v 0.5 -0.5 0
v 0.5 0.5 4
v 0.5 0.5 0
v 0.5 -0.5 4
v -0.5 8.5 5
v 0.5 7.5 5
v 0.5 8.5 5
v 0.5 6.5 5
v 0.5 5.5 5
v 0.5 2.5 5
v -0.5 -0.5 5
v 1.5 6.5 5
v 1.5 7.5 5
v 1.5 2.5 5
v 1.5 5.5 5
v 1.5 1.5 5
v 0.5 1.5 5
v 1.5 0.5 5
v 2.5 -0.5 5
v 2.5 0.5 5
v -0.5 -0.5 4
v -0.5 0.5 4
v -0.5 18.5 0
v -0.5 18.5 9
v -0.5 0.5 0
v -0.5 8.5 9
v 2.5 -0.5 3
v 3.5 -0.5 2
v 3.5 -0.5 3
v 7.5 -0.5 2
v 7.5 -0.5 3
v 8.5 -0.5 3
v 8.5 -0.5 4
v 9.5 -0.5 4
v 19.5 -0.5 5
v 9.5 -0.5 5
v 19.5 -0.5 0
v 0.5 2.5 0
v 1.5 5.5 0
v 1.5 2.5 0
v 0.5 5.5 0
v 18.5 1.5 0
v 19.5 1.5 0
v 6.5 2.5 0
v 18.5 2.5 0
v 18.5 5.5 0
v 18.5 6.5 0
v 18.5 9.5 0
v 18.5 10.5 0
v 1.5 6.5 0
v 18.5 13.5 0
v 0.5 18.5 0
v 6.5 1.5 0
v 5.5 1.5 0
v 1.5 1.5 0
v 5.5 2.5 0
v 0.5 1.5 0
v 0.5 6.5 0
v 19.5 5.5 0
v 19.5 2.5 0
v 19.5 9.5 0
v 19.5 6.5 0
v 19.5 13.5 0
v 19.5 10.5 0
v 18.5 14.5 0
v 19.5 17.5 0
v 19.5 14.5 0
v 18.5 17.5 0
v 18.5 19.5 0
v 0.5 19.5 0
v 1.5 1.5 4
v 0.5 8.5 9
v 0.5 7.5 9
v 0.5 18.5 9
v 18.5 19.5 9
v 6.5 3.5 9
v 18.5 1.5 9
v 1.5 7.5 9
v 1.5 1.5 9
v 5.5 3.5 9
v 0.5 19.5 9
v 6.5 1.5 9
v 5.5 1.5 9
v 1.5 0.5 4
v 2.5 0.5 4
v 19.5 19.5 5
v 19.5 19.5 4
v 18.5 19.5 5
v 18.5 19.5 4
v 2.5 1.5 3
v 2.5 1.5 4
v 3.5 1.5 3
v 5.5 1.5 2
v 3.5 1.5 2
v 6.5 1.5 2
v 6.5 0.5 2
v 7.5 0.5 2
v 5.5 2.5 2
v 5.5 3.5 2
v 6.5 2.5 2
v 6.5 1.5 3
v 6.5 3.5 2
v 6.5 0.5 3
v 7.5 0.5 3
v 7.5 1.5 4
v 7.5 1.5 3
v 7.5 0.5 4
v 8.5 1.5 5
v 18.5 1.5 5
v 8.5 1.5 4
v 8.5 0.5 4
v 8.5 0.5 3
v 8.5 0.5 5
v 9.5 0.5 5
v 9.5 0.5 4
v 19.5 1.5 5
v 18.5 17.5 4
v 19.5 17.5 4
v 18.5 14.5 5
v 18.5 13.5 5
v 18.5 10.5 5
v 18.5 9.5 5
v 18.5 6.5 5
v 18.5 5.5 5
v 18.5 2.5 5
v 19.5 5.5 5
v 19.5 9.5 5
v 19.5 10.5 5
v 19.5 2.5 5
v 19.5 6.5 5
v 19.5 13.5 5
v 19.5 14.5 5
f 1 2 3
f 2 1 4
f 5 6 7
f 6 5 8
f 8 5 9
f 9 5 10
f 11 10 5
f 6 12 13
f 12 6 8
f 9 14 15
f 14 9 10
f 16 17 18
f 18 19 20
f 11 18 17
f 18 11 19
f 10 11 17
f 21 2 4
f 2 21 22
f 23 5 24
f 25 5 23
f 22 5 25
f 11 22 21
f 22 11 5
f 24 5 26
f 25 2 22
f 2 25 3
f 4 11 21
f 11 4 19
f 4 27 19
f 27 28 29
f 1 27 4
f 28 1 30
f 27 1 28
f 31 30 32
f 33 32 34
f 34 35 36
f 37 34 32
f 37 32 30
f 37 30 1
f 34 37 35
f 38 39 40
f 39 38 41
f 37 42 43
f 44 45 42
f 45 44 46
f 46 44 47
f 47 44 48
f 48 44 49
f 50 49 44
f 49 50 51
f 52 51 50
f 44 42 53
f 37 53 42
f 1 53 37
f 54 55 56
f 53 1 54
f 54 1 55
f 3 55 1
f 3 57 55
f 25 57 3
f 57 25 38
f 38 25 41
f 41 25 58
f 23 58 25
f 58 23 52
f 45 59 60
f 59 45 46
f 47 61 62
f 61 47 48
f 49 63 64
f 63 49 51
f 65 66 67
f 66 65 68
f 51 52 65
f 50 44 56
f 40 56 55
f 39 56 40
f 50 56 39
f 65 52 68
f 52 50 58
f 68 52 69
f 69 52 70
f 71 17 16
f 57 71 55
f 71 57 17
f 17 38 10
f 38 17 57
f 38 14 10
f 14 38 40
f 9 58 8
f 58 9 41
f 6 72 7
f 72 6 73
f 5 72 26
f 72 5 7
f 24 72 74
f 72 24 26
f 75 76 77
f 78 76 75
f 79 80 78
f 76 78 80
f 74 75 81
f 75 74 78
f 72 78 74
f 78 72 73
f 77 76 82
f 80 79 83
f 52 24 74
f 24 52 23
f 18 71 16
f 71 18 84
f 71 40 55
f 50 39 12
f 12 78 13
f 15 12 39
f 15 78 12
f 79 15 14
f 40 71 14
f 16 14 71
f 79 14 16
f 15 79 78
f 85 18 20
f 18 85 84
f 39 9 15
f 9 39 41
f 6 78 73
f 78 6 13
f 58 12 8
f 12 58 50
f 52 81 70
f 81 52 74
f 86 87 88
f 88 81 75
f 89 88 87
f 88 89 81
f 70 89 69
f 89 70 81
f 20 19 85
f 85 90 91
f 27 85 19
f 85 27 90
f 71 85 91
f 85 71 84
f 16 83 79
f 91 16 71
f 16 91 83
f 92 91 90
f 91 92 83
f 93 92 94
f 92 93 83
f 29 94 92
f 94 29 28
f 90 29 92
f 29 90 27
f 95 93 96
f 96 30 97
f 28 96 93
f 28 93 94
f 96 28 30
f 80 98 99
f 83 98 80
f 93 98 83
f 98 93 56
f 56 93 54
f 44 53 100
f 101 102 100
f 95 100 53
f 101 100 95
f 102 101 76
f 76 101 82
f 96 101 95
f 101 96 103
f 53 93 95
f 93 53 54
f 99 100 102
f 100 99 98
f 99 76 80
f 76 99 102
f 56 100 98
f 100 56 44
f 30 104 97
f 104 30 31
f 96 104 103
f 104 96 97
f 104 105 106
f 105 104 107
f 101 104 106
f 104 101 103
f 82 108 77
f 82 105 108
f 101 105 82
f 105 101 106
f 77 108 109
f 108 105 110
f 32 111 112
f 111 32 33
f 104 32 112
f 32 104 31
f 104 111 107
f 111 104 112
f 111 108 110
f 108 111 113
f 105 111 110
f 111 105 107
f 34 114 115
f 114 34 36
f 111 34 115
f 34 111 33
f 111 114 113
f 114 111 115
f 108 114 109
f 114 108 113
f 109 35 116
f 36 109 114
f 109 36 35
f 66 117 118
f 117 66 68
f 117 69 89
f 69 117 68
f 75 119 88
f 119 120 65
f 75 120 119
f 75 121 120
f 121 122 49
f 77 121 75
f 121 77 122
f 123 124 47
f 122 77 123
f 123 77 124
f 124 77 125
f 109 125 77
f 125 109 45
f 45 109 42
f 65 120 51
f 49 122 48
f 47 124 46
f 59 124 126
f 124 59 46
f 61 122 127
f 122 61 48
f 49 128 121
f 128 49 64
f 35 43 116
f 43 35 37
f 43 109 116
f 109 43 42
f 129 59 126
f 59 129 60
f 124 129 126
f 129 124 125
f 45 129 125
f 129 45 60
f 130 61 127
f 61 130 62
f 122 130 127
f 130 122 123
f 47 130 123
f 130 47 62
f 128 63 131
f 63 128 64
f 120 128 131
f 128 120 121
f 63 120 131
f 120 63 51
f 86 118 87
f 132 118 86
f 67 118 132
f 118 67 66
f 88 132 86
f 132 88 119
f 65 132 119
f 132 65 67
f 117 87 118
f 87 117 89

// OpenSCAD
union() {
    translate([0, 0, 4.5]) color([1, 0, 0]) cube([1, 1, 1], center=true);
    translate([0, 1, 2.5]) cube([1, 1, 5], center=true);
    translate([0, 2, 2.5]) cube([1, 1, 5], center=true);
    translate([0, 3, 2.5]) cube([1, 1, 5], center=true);
    translate([0, 4, 2.5]) cube([1, 1, 5], center=true);
    translate([0, 5, 2.5]) cube([1, 1, 5], center=true);
    translate([0, 6, 2.5]) cube([1, 1, 5], center=true);
    translate([0, 7, 2.5]) cube([1, 1, 5], center=true);
    translate([0, 8, 2.5]) cube([1, 1, 5], center=true);
    translate([0, 9, 4.5]) cube([1, 1, 9], center=true);
    translate([0, 10, 4.5]) cube([1, 1, 9], center=true);
    translate([0, 11, 4.5]) cube([1, 1, 9], center=true);
    translate([0, 12, 4.5]) cube([1, 1, 9], center=true);
    translate([0, 13, 4.5]) cube([1, 1, 9], center=true);
    translate([0, 14, 4.5]) cube([1, 1, 9], center=true);
    translate([0, 15, 4.5]) cube([1, 1, 9], center=true);
    translate([0, 16, 4.5]) cube([1, 1, 9], center=true);
    translate([0, 17, 4.5]) cube([1, 1, 9], center=true);
    translate([0, 18, 4.5]) cube([1, 1, 9], center=true);
    translate([1, 0, 2.5]) cube([1, 1, 5], center=true);
    translate([1, 1, 2.5]) cube([1, 1, 5], center=true);
    translate([1, 3, 2.5]) cube([1, 1, 5], center=true);
    translate([1, 4, 2.5]) cube([1, 1, 5], center=true);
    translate([1, 5, 2.5]) cube([1, 1, 5], center=true);
    translate([1, 7, 2.5]) cube([1, 1, 5], center=true);
    translate([1, 8, 4.5]) cube([1, 1, 9], center=true);
    translate([1, 9, 4.5]) cube([1, 1, 9], center=true);
    translate([1, 10, 4.5]) cube([1, 1, 9], center=true);
    translate([1, 11, 4.5]) cube([1, 1, 9], center=true);
    translate([1, 12, 4.5]) cube([1, 1, 9], center=true);
    translate([1, 13, 4.5]) cube([1, 1, 9], center=true);
    translate([1, 14, 4.5]) cube([1, 1, 9], center=true);
    translate([1, 15, 4.5]) cube([1, 1, 9], center=true);
    translate([1, 16, 4.5]) cube([1, 1, 9], center=true);
    translate([1, 17, 4.5]) cube([1, 1, 9], center=true);
    translate([1, 18, 4.5]) cube([1, 1, 9], center=true);
    translate([1, 19, 4.5]) cube([1, 1, 9], center=true);
    translate([2, 0, 2.5]) cube([1, 1, 5], center=true);
    translate([2, 1, 2.0]) cube([1, 1, 4], center=true);
    translate([2, 2, 4.5]) cube([1, 1, 9], center=true);
    translate([2, 3, 4.5]) cube([1, 1, 9], center=true);
    translate([2, 4, 4.5]) cube([1, 1, 9], center=true);
    translate([2, 5, 4.5]) cube([1, 1, 9], center=true);
    translate([2, 6, 4.5]) cube([1, 1, 9], center=true);
    translate([2, 7, 4.5]) cube([1, 1, 9], center=true);
    translate([2, 8, 4.5]) cube([1, 1, 9], center=true);
    translate([2, 9, 4.5]) cube([1, 1, 9], center=true);
    translate([2, 10, 4.5]) cube([1, 1, 9], center=true);
    translate([2, 11, 4.5]) cube([1, 1, 9], center=true);
    translate([2, 12, 4.5]) cube([1, 1, 9], center=true);
    translate([2, 13, 4.5]) cube([1, 1, 9], center=true);
    translate([2, 14, 4.5]) cube([1, 1, 9], center=true);
    translate([2, 15, 4.5]) cube([1, 1, 9], center=true);
    translate([2, 16, 4.5]) cube([1, 1, 9], center=true);
    translate([2, 17, 4.5]) cube([1, 1, 9], center=true);
    translate([2, 18, 4.5]) cube([1, 1, 9], center=true);
    translate([2, 19, 4.5]) cube([1, 1, 9], center=true);
    translate([3, 0, 1.5]) cube([1, 1, 3], center=true);
    translate([3, 1, 1.5]) cube([1, 1, 3], center=true);
    translate([3, 2, 4.5]) cube([1, 1, 9], center=true);
    translate([3, 3, 4.5]) cube([1, 1, 9], center=true);
    translate([3, 4, 4.5]) cube([1, 1, 9], center=true);
    translate([3, 5, 4.5]) cube([1, 1, 9], center=true);
    translate([3, 6, 4.5]) cube([1, 1, 9], center=true);
    translate([3, 7, 4.5]) cube([1, 1, 9], center=true);
    translate([3, 8, 4.5]) cube([1, 1, 9], center=true);
    translate([3, 9, 4.5]) cube([1, 1, 9], center=true);
    translate([3, 10, 4.5]) cube([1, 1, 9], center=true);
    translate([3, 11, 4.5]) cube([1, 1, 9], center=true);
    translate([3, 12, 4.5]) cube([1, 1, 9], center=true);
    translate([3, 13, 4.5]) cube([1, 1, 9], center=true);
    translate([3, 14, 4.5]) cube([1, 1, 9], center=true);
    translate([3, 15, 4.5]) cube([1, 1, 9], center=true);
    translate([3, 16, 4.5]) cube([1, 1, 9], center=true);
    translate([3, 17, 4.5]) cube([1, 1, 9], center=true);
    translate([3, 18, 4.5]) cube([1, 1, 9], center=true);
    translate([3, 19, 4.5]) cube([1, 1, 9], center=true);
    translate([4, 0, 1.0]) cube([1, 1, 2], center=true);
    translate([4, 1, 1.0]) cube([1, 1, 2], center=true);
    translate([4, 2, 4.5]) cube([1, 1, 9], center=true);
    translate([4, 3, 4.5]) cube([1, 1, 9], center=true);
    translate([4, 4, 4.5]) cube([1, 1, 9], center=true);
    translate([4, 5, 4.5]) cube([1, 1, 9], center=true);
    translate([4, 6, 4.5]) cube([1, 1, 9], center=true);
    translate([4, 7, 4.5]) cube([1, 1, 9], center=true);
    translate([4, 8, 4.5]) cube([1, 1, 9], center=true);
    translate([4, 9, 4.5]) cube([1, 1, 9], center=true);
    translate([4, 10, 4.5]) cube([1, 1, 9], center=true);
    translate([4, 11, 4.5]) cube([1, 1, 9], center=true);
    translate([4, 12, 4.5]) cube([1, 1, 9], center=true);
    translate([4, 13, 4.5]) cube([1, 1, 9], center=true);
    translate([4, 14, 4.5]) cube([1, 1, 9], center=true);
    translate([4, 15, 4.5]) cube([1, 1, 9], center=true);
    translate([4, 16, 4.5]) cube([1, 1, 9], center=true);
    translate([4, 17, 4.5]) cube([1, 1, 9], center=true);
    translate([4, 18, 4.5]) cube([1, 1, 9], center=true);
    translate([4, 19, 4.5]) cube([1, 1, 9], center=true);
    translate([5, 0, 1.0]) cube([1, 1, 2], center=true);
    translate([5, 1, 1.0]) cube([1, 1, 2], center=true);
    translate([5, 2, 4.5]) cube([1, 1, 9], center=true);
    translate([5, 3, 4.5]) cube([1, 1, 9], center=true);
    translate([5, 4, 4.5]) cube([1, 1, 9], center=true);
    translate([5, 5, 4.5]) cube([1, 1, 9], center=true);
    translate([5, 6, 4.5]) cube([1, 1, 9], center=true);
    translate([5, 7, 4.5]) cube([1, 1, 9], center=true);
    translate([5, 8, 4.5]) cube([1, 1, 9], center=true);
    translate([5, 9, 4.5]) cube([1, 1, 9], center=true);
    translate([5, 10, 4.5]) cube([1, 1, 9], center=true);
    translate([5, 11, 4.5]) cube([1, 1, 9], center=true);
    translate([5, 12, 4.5]) cube([1, 1, 9], center=true);
    translate([5, 13, 4.5]) cube([1, 1, 9], center=true);
    translate([5, 14, 4.5]) cube([1, 1, 9], center=true);
    translate([5, 15, 4.5]) cube([1, 1, 9], center=true);
    translate([5, 16, 4.5]) cube([1, 1, 9], center=true);
    translate([5, 17, 4.5]) cube([1, 1, 9], center=true);
    translate([5, 18, 4.5]) cube([1, 1, 9], center=true);
    translate([5, 19, 4.5]) cube([1, 1, 9], center=true);
    translate([6, 0, 1.0]) cube([1, 1, 2], center=true);
    translate([6, 1, 1.0]) cube([1, 1, 2], center=true);
    translate([6, 3, 1.0]) cube([1, 1, 2], center=true);
    translate([6, 4, 4.5]) cube([1, 1, 9], center=true);
    translate([6, 5, 4.5]) cube([1, 1, 9], center=true);
    translate([6, 6, 4.5]) cube([1, 1, 9], center=true);
    translate([6, 7, 4.5]) cube([1, 1, 9], center=true);
    translate([6, 8, 4.5]) cube([1, 1, 9], center=true);
    translate([6, 9, 4.5]) cube([1, 1, 9], center=true);
    translate([6, 10, 4.5]) cube([1, 1, 9], center=true);
    translate([6, 11, 4.5]) cube([1, 1, 9], center=true);
    translate([6, 12, 4.5]) cube([1, 1, 9], center=true);
    translate([6, 13, 4.5]) cube([1, 1, 9], center=true);
    translate([6, 14, 4.5]) cube([1, 1, 9], center=true);
    translate([6, 15, 4.5]) cube([1, 1, 9], center=true);
    translate([6, 16, 4.5]) cube([1, 1, 9], center=true);
    translate([6, 17, 4.5]) cube([1, 1, 9], center=true);
    translate([6, 18, 4.5]) cube([1, 1, 9], center=true);
    translate([6, 19, 4.5]) cube([1, 1, 9], center=true);
    translate([7, 0, 1.0]) cube([1, 1, 2], center=true);
    translate([7, 1, 1.5]) cube([1, 1, 3], center=true);
    translate([7, 2, 4.5]) cube([1, 1, 9], center=true);
    translate([7, 3, 4.5]) cube([1, 1, 9], center=true);
    translate([7, 4, 4.5]) cube([1, 1, 9], center=true);
    translate([7, 5, 4.5]) cube([1, 1, 9], center=true);
    translate([7, 6, 4.5]) cube([1, 1, 9], center=true);
    translate([7, 7, 4.5]) cube([1, 1, 9], center=true);
    translate([7, 8, 4.5]) cube([1, 1, 9], center=true);
    translate([7, 9, 4.5]) cube([1, 1, 9], center=true);
    translate([7, 10, 4.5]) cube([1, 1, 9], center=true);
    translate([7, 11, 4.5]) cube([1, 1, 9], center=true);
    translate([7, 12, 4.5]) cube([1, 1, 9], center=true);
    translate([7, 13, 4.5]) cube([1, 1, 9], center=true);
    translate([7, 14, 4.5]) cube([1, 1, 9], center=true);
    translate([7, 15, 4.5]) cube([1, 1, 9], center=true);
    translate([7, 16, 4.5]) cube([1, 1, 9], center=true);
    translate([7, 17, 4.5]) cube([1, 1, 9], center=true);
    translate([7, 18, 4.5]) cube([1, 1, 9], center=true);
    translate([7, 19, 4.5]) cube([1, 1, 9], center=true);
    translate([8, 0, 1.5]) cube([1, 1, 3], center=true);
    translate([8, 1, 2.0]) cube([1, 1, 4], center=true);
    translate([8, 2, 4.5]) cube([1, 1, 9], center=true);
    translate([8, 3, 4.5]) cube([1, 1, 9], center=true);
    translate([8, 4, 4.5]) cube([1, 1, 9], center=true);
    translate([8, 5, 4.5]) cube([1, 1, 9], center=true);
    translate([8, 6, 4.5]) cube([1, 1, 9], center=true);
    translate([8, 7, 4.5]) cube([1, 1, 9], center=true);
    translate([8, 8, 4.5]) cube([1, 1, 9], center=true);
    translate([8, 9, 4.5]) cube([1, 1, 9], center=true);
    translate([8, 10, 4.5]) cube([1, 1, 9], center=true);
    translate([8, 11, 4.5]) cube([1, 1, 9], center=true);
    translate([8, 12, 4.5]) cube([1, 1, 9], center=true);
    translate([8, 13, 4.5]) cube([1, 1, 9], center=true);
    translate([8, 14, 4.5]) cube([1, 1, 9], center=true);
    translate([8, 15, 4.5]) cube([1, 1, 9], center=true);
    translate([8, 16, 4.5]) cube([1, 1, 9], center=true);
    translate([8, 17, 4.5]) cube([1, 1, 9], center=true);
    translate([8, 18, 4.5]) cube([1, 1, 9], center=true);
    translate([8, 19, 4.5]) cube([1, 1, 9], center=true);
    translate([9, 0, 2.0]) cube([1, 1, 4], center=true);
    translate([9, 1, 2.5]) cube([1, 1, 5], center=true);
    translate([9, 2, 4.5]) cube([1, 1, 9], center=true);
    translate([9, 3, 4.5]) cube([1, 1, 9], center=true);
    translate([9, 4, 4.5]) cube([1, 1, 9], center=true);
    translate([9, 5, 4.5]) cube([1, 1, 9], center=true);
    translate([9, 6, 4.5]) cube([1, 1, 9], center=true);
    translate([9, 7, 4.5]) cube([1, 1, 9], center=true);
    translate([9, 8, 4.5]) cube([1, 1, 9], center=true);
    translate([9, 9, 4.5]) cube([1, 1, 9], center=true);
    translate([9, 10, 4.5]) cube([1, 1, 9], center=true);
    translate([9, 11, 4.5]) cube([1, 1, 9], center=true);
    translate([9, 12, 4.5]) cube([1, 1, 9], center=true);
    translate([9, 13, 4.5]) cube([1, 1, 9], center=true);
    translate([9, 14, 4.5]) cube([1, 1, 9], center=true);
    translate([9, 15, 4.5]) cube([1, 1, 9], center=true);
    translate([9, 16, 4.5]) cube([1, 1, 9], center=true);
    translate([9, 17, 4.5]) cube([1, 1, 9], center=true);
    translate([9, 18, 4.5]) cube([1, 1, 9], center=true);
    translate([9, 19, 4.5]) cube([1, 1, 9], center=true);
    translate([10, 0, 2.5]) cube([1, 1, 5], center=true);
    translate([10, 1, 2.5]) cube([1, 1, 5], center=true);
    translate([10, 2, 4.5]) cube([1, 1, 9], center=true);
    translate([10, 3, 4.5]) cube([1, 1, 9], center=true);
    translate([10, 4, 4.5]) cube([1, 1, 9], center=true);
    translate([10, 5, 4.5]) cube([1, 1, 9], center=true);
    translate([10, 6, 4.5]) cube([1, 1, 9], center=true);
    translate([10, 7, 4.5]) cube([1, 1, 9], center=true);
    translate([10, 8, 4.5]) cube([1, 1, 9], center=true);
    translate([10, 9, 4.5]) cube([1, 1, 9], center=true);
    translate([10, 10, 4.5]) cube([1, 1, 9], center=true);
    translate([10, 11, 4.5]) cube([1, 1, 9], center=true);
    translate([10, 12, 4.5]) cube([1, 1, 9], center=true);
    translate([10, 13, 4.5]) cube([1, 1, 9], center=true);
    translate([10, 14, 4.5]) cube([1, 1, 9], center=true);
    translate([10, 15, 4.5]) cube([1, 1, 9], center=true);
    translate([10, 16, 4.5]) cube([1, 1, 9], center=true);
    translate([10, 17, 4.5]) cube([1, 1, 9], center=true);
    translate([10, 18, 4.5]) cube([1, 1, 9], center=true);
    translate([10, 19, 4.5]) cube([1, 1, 9], center=true);
    translate([11, 0, 2.5]) cube([1, 1, 5], center=true);
    translate([11, 1, 2.5]) cube([1, 1, 5], center=true);
    translate([11, 2, 4.5]) cube([1, 1, 9], center=true);
    translate([11, 3, 4.5]) cube([1, 1, 9], center=true);
    translate([11, 4, 4.5]) cube([1, 1, 9], center=true);
    translate([11, 5, 4.5]) cube([1, 1, 9], center=true);
    translate([11, 6, 4.5]) cube([1, 1, 9], center=true);
    translate([11, 7, 4.5]) cube([1, 1, 9], center=true);
    translate([11, 8, 4.5]) cube([1, 1, 9], center=true);
    translate([11, 9, 4.5]) cube([1, 1, 9], center=true);
    translate([11, 10, 4.5]) cube([1, 1, 9], center=true);
    translate([11, 11, 4.5]) cube([1, 1, 9], center=true);
    translate([11, 12, 4.5]) cube([1, 1, 9], center=true);
    translate([11, 13, 4.5]) cube([1, 1, 9], center=true);
    translate([11, 14, 4.5]) cube([1, 1, 9], center=true);
    translate([11, 15, 4.5]) cube([1, 1, 9], center=true);
    translate([11, 16, 4.5]) cube([1, 1, 9], center=true);
    translate([11, 17, 4.5]) cube([1, 1, 9], center=true);
    translate([11, 18, 4.5]) cube([1, 1, 9], center=true);
    translate([11, 19, 4.5]) cube([1, 1, 9], center=true);
    translate([12, 0, 2.5]) cube([1, 1, 5], center=true);
    translate([12, 1, 2.5]) cube([1, 1, 5], center=true);
    translate([12, 2, 4.5]) cube([1, 1, 9], center=true);
    translate([12, 3, 4.5]) cube([1, 1, 9], center=true);
    translate([12, 4, 4.5]) cube([1, 1, 9], center=true);
    translate([12, 5, 4.5]) cube([1, 1, 9], center=true);
    translate([12, 6, 4.5]) cube([1, 1, 9], center=true);
    translate([12, 7, 4.5]) cube([1, 1, 9], center=true);
    translate([12, 8, 4.5]) cube([1, 1, 9], center=true);
    translate([12, 9, 4.5]) cube([1, 1, 9], center=true);
    translate([12, 10, 4.5]) cube([1, 1, 9], center=true);
    translate([12, 11, 4.5]) cube([1, 1, 9], center=true);
    translate([12, 12, 4.5]) cube([1, 1, 9], center=true);
    translate([12, 13, 4.5]) cube([1, 1, 9], center=true);
    translate([12, 14, 4.5]) cube([1, 1, 9], center=true);
    translate([12, 15, 4.5]) cube([1, 1, 9], center=true);
    translate([12, 16, 4.5]) cube([1, 1, 9], center=true);
    translate([12, 17, 4.5]) cube([1, 1, 9], center=true);
    translate([12, 18, 4.5]) cube([1, 1, 9], center=true);
    translate([12, 19, 4.5]) cube([1, 1, 9], center=true);
    translate([13, 0, 2.5]) cube([1, 1, 5], center=true);
    translate([13, 1, 2.5]) cube([1, 1, 5], center=true);
    translate([13, 2, 4.5]) cube([1, 1, 9], center=true);
    translate([13, 3, 4.5]) cube([1, 1, 9], center=true);
    translate([13, 4, 4.5]) cube([1, 1, 9], center=true);
    translate([13, 5, 4.5]) cube([1, 1, 9], center=true);
    translate([13, 6, 4.5]) cube([1, 1, 9], center=true);
    translate([13, 7, 4.5]) cube([1, 1, 9], center=true);
    translate([13, 8, 4.5]) cube([1, 1, 9], center=true);
    translate([13, 9, 4.5]) cube([1, 1, 9], center=true);
    translate([13, 10, 4.5]) cube([1, 1, 9], center=true);
    translate([13, 11, 4.5]) cube([1, 1, 9], center=true);
    translate([13, 12, 4.5]) cube([1, 1, 9], center=true);
    translate([13, 13, 4.5]) cube([1, 1, 9], center=true);
    translate([13, 14, 4.5]) cube([1, 1, 9], center=true);
    translate([13, 15, 4.5]) cube([1, 1, 9], center=true);
    translate([13, 16, 4.5]) cube([1, 1, 9], center=true);
    translate([13, 17, 4.5]) cube([1, 1, 9], center=true);
    translate([13, 18, 4.5]) cube([1, 1, 9], center=true);
    translate([13, 19, 4.5]) cube([1, 1, 9], center=true);
    translate([14, 0, 2.5]) cube([1, 1, 5], center=true);
    translate([14, 1, 2.5]) cube([1, 1, 5], center=true);
    translate([14, 2, 4.5]) cube([1, 1, 9], center=true);
    translate([14, 3, 4.5]) cube([1, 1, 9], center=true);
    translate([14, 4, 4.5]) cube([1, 1, 9], center=true);
    translate([14, 5, 4.5]) cube([1, 1, 9], center=true);
    translate([14, 6, 4.5]) cube([1, 1, 9], center=true);
    translate([14, 7, 4.5]) cube([1, 1, 9], center=true);
    translate([14, 8, 4.5]) cube([1, 1, 9], center=true);
    translate([14, 9, 4.5]) cube([1, 1, 9], center=true);
    translate([14, 10, 4.5]) cube([1, 1, 9], center=true);
    translate([14, 11, 4.5]) cube([1, 1, 9], center=true);
    translate([14, 12, 4.5]) cube([1, 1, 9], center=true);
    translate([14, 13, 4.5]) cube([1, 1, 9], center=true);
    translate([14, 14, 4.5]) cube([1, 1, 9], center=true);
    translate([14, 15, 4.5]) cube([1, 1, 9], center=true);
    translate([14, 16, 4.5]) cube([1, 1, 9], center=true);
    translate([14, 17, 4.5]) cube([1, 1, 9], center=true);
    translate([14, 18, 4.5]) cube([1, 1, 9], center=true);
    translate([14, 19, 4.5]) cube([1, 1, 9], center=true);
    translate([15, 0, 2.5]) cube([1, 1, 5], center=true);
    translate([15, 1, 2.5]) cube([1, 1, 5], center=true);
    translate([15, 2, 4.5]) cube([1, 1, 9], center=true);
    translate([15, 3, 4.5]) cube([1, 1, 9], center=true);
    translate([15, 4, 4.5]) cube([1, 1, 9], center=true);
    translate([15, 5, 4.5]) cube([1, 1, 9], center=true);
    translate([15, 6, 4.5]) cube([1, 1, 9], center=true);
    translate([15, 7, 4.5]) cube([1, 1, 9], center=true);
    translate([15, 8, 4.5]) cube([1, 1, 9], center=true);
    translate([15, 9, 4.5]) cube([1, 1, 9], center=true);
    translate([15, 10, 4.5]) cube([1, 1, 9], center=true);
    translate([15, 11, 4.5]) cube([1, 1, 9], center=true);
    translate([15, 12, 4.5]) cube([1, 1, 9], center=true);
    translate([15, 13, 4.5]) cube([1, 1, 9], center=true);
    translate([15, 14, 4.5]) cube([1, 1, 9], center=true);
    translate([15, 15, 4.5]) cube([1, 1, 9], center=true);
    translate([15, 16, 4.5]) cube([1, 1, 9], center=true);
    translate([15, 17, 4.5]) cube([1, 1, 9], center=true);
    translate([15, 18, 4.5]) cube([1, 1, 9], center=true);
    translate([15, 19, 4.5]) cube([1, 1, 9], center=true);
    translate([16, 0, 2.5]) cube([1, 1, 5], center=true);
    translate([16, 1, 2.5]) cube([1, 1, 5], center=true);
    translate([16, 2, 4.5]) cube([1, 1, 9], center=true);
    translate([16, 3, 4.5]) cube([1, 1, 9], center=true);
    translate([16, 4, 4.5]) cube([1, 1, 9], center=true);
    translate([16, 5, 4.5]) cube([1, 1, 9], center=true);
    translate([16, 6, 4.5]) cube([1, 1, 9], center=true);
    translate([16, 7, 4.5]) cube([1, 1, 9], center=true);
    translate([16, 8, 4.5]) cube([1, 1, 9], center=true);
    translate([16, 9, 4.5]) cube([1, 1, 9], center=true);
    translate([16, 10, 4.5]) cube([1, 1, 9], center=true);
    translate([16, 11, 4.5]) cube([1, 1, 9], center=true);
    translate([16, 12, 4.5]) cube([1, 1, 9], center=true);
    translate([16, 13, 4.5]) cube([1, 1, 9], center=true);
    translate([16, 14, 4.5]) cube([1, 1, 9], center=true);
    translate([16, 15, 4.5]) cube([1, 1, 9], center=true);
    translate([16, 16, 4.5]) cube([1, 1, 9], center=true);
    translate([16, 17, 4.5]) cube([1, 1, 9], center=true);
    translate([16, 18, 4.5]) cube([1, 1, 9], center=true);
    translate([16, 19, 4.5]) cube([1, 1, 9], center=true);
    translate([17, 0, 2.5]) cube([1, 1, 5], center=true);
    translate([17, 1, 2.5]) cube([1, 1, 5], center=true);
    translate([17, 2, 4.5]) cube([1, 1, 9], center=true);
    translate([17, 3, 4.5]) cube([1, 1, 9], center=true);
    translate([17, 4, 4.5]) cube([1, 1, 9], center=true);
    translate([17, 5, 4.5]) cube([1, 1, 9], center=true);
    translate([17, 6, 4.5]) cube([1, 1, 9], center=true);
    translate([17, 7, 4.5]) cube([1, 1, 9], center=true);
    translate([17, 8, 4.5]) cube([1, 1, 9], center=true);
    translate([17, 9, 4.5]) cube([1, 1, 9], center=true);
    translate([17, 10, 4.5]) cube([1, 1, 9], center=true);
    translate([17, 11, 4.5]) cube([1, 1, 9], center=true);
    translate([17, 12, 4.5]) cube([1, 1, 9], center=true);
    translate([17, 13, 4.5]) cube([1, 1, 9], center=true);
    translate([17, 14, 4.5]) cube([1, 1, 9], center=true);
    translate([17, 15, 4.5]) cube([1, 1, 9], center=true);
    translate([17, 16, 4.5]) cube([1, 1, 9], center=true);
    translate([17, 17, 4.5]) cube([1, 1, 9], center=true);
    translate([17, 18, 4.5]) cube([1, 1, 9], center=true);
    translate([17, 19, 4.5]) cube([1, 1, 9], center=true);
    translate([18, 0, 2.5]) cube([1, 1, 5], center=true);
    translate([18, 1, 2.5]) cube([1, 1, 5], center=true);
    translate([18, 2, 4.5]) cube([1, 1, 9], center=true);
    translate([18, 3, 4.5]) cube([1, 1, 9], center=true);
    translate([18, 4, 4.5]) cube([1, 1, 9], center=true);
    translate([18, 5, 4.5]) cube([1, 1, 9], center=true);
    translate([18, 6, 4.5]) cube([1, 1, 9], center=true);
    translate([18, 7, 4.5]) cube([1, 1, 9], center=true);
    translate([18, 8, 4.5]) cube([1, 1, 9], center=true);
    translate([18, 9, 4.5]) cube([1, 1, 9], center=true);
    translate([18, 10, 4.5]) cube([1, 1, 9], center=true);
    translate([18, 11, 4.5]) cube([1, 1, 9], center=true);
    translate([18, 12, 4.5]) cube([1, 1, 9], center=true);
    translate([18, 13, 4.5]) cube([1, 1, 9], center=true);
    translate([18, 14, 4.5]) cube([1, 1, 9], center=true);
    translate([18, 15, 4.5]) cube([1, 1, 9], center=true);
    translate([18, 16, 4.5]) cube([1, 1, 9], center=true);
    translate([18, 17, 4.5]) cube([1, 1, 9], center=true);
    translate([18, 18, 4.5]) cube([1, 1, 9], center=true);
    translate([18, 19, 4.5]) cube([1, 1, 9], center=true);
    translate([19, 0, 2.5]) cube([1, 1, 5], center=true);
    translate([19, 1, 2.5]) cube([1, 1, 5], center=true);
    translate([19, 3, 2.5]) cube([1, 1, 5], center=true);
    translate([19, 4, 2.5]) cube([1, 1, 5], center=true);
    translate([19, 5, 2.5]) cube([1, 1, 5], center=true);
    translate([19, 7, 2.5]) cube([1, 1, 5], center=true);
    translate([19, 8, 2.5]) cube([1, 1, 5], center=true);
    translate([19, 9, 2.5]) cube([1, 1, 5], center=true);
    translate([19, 11, 2.5]) cube([1, 1, 5], center=true);
    translate([19, 12, 2.5]) cube([1, 1, 5], center=true);
    translate([19, 13, 2.5]) cube([1, 1, 5], center=true);
    translate([19, 15, 2.5]) cube([1, 1, 5], center=true);
    translate([19, 16, 2.5]) cube([1, 1, 5], center=true);
    translate([19, 17, 2.5]) cube([1, 1, 5], center=true);
    translate([19, 18, 4.5]) color([0, 0, 1]) cube([1, 1, 1], center=true);
    translate([19, 19, 4.5]) color([0, 0, 1]) cube([1, 1, 1], center=true);
}
